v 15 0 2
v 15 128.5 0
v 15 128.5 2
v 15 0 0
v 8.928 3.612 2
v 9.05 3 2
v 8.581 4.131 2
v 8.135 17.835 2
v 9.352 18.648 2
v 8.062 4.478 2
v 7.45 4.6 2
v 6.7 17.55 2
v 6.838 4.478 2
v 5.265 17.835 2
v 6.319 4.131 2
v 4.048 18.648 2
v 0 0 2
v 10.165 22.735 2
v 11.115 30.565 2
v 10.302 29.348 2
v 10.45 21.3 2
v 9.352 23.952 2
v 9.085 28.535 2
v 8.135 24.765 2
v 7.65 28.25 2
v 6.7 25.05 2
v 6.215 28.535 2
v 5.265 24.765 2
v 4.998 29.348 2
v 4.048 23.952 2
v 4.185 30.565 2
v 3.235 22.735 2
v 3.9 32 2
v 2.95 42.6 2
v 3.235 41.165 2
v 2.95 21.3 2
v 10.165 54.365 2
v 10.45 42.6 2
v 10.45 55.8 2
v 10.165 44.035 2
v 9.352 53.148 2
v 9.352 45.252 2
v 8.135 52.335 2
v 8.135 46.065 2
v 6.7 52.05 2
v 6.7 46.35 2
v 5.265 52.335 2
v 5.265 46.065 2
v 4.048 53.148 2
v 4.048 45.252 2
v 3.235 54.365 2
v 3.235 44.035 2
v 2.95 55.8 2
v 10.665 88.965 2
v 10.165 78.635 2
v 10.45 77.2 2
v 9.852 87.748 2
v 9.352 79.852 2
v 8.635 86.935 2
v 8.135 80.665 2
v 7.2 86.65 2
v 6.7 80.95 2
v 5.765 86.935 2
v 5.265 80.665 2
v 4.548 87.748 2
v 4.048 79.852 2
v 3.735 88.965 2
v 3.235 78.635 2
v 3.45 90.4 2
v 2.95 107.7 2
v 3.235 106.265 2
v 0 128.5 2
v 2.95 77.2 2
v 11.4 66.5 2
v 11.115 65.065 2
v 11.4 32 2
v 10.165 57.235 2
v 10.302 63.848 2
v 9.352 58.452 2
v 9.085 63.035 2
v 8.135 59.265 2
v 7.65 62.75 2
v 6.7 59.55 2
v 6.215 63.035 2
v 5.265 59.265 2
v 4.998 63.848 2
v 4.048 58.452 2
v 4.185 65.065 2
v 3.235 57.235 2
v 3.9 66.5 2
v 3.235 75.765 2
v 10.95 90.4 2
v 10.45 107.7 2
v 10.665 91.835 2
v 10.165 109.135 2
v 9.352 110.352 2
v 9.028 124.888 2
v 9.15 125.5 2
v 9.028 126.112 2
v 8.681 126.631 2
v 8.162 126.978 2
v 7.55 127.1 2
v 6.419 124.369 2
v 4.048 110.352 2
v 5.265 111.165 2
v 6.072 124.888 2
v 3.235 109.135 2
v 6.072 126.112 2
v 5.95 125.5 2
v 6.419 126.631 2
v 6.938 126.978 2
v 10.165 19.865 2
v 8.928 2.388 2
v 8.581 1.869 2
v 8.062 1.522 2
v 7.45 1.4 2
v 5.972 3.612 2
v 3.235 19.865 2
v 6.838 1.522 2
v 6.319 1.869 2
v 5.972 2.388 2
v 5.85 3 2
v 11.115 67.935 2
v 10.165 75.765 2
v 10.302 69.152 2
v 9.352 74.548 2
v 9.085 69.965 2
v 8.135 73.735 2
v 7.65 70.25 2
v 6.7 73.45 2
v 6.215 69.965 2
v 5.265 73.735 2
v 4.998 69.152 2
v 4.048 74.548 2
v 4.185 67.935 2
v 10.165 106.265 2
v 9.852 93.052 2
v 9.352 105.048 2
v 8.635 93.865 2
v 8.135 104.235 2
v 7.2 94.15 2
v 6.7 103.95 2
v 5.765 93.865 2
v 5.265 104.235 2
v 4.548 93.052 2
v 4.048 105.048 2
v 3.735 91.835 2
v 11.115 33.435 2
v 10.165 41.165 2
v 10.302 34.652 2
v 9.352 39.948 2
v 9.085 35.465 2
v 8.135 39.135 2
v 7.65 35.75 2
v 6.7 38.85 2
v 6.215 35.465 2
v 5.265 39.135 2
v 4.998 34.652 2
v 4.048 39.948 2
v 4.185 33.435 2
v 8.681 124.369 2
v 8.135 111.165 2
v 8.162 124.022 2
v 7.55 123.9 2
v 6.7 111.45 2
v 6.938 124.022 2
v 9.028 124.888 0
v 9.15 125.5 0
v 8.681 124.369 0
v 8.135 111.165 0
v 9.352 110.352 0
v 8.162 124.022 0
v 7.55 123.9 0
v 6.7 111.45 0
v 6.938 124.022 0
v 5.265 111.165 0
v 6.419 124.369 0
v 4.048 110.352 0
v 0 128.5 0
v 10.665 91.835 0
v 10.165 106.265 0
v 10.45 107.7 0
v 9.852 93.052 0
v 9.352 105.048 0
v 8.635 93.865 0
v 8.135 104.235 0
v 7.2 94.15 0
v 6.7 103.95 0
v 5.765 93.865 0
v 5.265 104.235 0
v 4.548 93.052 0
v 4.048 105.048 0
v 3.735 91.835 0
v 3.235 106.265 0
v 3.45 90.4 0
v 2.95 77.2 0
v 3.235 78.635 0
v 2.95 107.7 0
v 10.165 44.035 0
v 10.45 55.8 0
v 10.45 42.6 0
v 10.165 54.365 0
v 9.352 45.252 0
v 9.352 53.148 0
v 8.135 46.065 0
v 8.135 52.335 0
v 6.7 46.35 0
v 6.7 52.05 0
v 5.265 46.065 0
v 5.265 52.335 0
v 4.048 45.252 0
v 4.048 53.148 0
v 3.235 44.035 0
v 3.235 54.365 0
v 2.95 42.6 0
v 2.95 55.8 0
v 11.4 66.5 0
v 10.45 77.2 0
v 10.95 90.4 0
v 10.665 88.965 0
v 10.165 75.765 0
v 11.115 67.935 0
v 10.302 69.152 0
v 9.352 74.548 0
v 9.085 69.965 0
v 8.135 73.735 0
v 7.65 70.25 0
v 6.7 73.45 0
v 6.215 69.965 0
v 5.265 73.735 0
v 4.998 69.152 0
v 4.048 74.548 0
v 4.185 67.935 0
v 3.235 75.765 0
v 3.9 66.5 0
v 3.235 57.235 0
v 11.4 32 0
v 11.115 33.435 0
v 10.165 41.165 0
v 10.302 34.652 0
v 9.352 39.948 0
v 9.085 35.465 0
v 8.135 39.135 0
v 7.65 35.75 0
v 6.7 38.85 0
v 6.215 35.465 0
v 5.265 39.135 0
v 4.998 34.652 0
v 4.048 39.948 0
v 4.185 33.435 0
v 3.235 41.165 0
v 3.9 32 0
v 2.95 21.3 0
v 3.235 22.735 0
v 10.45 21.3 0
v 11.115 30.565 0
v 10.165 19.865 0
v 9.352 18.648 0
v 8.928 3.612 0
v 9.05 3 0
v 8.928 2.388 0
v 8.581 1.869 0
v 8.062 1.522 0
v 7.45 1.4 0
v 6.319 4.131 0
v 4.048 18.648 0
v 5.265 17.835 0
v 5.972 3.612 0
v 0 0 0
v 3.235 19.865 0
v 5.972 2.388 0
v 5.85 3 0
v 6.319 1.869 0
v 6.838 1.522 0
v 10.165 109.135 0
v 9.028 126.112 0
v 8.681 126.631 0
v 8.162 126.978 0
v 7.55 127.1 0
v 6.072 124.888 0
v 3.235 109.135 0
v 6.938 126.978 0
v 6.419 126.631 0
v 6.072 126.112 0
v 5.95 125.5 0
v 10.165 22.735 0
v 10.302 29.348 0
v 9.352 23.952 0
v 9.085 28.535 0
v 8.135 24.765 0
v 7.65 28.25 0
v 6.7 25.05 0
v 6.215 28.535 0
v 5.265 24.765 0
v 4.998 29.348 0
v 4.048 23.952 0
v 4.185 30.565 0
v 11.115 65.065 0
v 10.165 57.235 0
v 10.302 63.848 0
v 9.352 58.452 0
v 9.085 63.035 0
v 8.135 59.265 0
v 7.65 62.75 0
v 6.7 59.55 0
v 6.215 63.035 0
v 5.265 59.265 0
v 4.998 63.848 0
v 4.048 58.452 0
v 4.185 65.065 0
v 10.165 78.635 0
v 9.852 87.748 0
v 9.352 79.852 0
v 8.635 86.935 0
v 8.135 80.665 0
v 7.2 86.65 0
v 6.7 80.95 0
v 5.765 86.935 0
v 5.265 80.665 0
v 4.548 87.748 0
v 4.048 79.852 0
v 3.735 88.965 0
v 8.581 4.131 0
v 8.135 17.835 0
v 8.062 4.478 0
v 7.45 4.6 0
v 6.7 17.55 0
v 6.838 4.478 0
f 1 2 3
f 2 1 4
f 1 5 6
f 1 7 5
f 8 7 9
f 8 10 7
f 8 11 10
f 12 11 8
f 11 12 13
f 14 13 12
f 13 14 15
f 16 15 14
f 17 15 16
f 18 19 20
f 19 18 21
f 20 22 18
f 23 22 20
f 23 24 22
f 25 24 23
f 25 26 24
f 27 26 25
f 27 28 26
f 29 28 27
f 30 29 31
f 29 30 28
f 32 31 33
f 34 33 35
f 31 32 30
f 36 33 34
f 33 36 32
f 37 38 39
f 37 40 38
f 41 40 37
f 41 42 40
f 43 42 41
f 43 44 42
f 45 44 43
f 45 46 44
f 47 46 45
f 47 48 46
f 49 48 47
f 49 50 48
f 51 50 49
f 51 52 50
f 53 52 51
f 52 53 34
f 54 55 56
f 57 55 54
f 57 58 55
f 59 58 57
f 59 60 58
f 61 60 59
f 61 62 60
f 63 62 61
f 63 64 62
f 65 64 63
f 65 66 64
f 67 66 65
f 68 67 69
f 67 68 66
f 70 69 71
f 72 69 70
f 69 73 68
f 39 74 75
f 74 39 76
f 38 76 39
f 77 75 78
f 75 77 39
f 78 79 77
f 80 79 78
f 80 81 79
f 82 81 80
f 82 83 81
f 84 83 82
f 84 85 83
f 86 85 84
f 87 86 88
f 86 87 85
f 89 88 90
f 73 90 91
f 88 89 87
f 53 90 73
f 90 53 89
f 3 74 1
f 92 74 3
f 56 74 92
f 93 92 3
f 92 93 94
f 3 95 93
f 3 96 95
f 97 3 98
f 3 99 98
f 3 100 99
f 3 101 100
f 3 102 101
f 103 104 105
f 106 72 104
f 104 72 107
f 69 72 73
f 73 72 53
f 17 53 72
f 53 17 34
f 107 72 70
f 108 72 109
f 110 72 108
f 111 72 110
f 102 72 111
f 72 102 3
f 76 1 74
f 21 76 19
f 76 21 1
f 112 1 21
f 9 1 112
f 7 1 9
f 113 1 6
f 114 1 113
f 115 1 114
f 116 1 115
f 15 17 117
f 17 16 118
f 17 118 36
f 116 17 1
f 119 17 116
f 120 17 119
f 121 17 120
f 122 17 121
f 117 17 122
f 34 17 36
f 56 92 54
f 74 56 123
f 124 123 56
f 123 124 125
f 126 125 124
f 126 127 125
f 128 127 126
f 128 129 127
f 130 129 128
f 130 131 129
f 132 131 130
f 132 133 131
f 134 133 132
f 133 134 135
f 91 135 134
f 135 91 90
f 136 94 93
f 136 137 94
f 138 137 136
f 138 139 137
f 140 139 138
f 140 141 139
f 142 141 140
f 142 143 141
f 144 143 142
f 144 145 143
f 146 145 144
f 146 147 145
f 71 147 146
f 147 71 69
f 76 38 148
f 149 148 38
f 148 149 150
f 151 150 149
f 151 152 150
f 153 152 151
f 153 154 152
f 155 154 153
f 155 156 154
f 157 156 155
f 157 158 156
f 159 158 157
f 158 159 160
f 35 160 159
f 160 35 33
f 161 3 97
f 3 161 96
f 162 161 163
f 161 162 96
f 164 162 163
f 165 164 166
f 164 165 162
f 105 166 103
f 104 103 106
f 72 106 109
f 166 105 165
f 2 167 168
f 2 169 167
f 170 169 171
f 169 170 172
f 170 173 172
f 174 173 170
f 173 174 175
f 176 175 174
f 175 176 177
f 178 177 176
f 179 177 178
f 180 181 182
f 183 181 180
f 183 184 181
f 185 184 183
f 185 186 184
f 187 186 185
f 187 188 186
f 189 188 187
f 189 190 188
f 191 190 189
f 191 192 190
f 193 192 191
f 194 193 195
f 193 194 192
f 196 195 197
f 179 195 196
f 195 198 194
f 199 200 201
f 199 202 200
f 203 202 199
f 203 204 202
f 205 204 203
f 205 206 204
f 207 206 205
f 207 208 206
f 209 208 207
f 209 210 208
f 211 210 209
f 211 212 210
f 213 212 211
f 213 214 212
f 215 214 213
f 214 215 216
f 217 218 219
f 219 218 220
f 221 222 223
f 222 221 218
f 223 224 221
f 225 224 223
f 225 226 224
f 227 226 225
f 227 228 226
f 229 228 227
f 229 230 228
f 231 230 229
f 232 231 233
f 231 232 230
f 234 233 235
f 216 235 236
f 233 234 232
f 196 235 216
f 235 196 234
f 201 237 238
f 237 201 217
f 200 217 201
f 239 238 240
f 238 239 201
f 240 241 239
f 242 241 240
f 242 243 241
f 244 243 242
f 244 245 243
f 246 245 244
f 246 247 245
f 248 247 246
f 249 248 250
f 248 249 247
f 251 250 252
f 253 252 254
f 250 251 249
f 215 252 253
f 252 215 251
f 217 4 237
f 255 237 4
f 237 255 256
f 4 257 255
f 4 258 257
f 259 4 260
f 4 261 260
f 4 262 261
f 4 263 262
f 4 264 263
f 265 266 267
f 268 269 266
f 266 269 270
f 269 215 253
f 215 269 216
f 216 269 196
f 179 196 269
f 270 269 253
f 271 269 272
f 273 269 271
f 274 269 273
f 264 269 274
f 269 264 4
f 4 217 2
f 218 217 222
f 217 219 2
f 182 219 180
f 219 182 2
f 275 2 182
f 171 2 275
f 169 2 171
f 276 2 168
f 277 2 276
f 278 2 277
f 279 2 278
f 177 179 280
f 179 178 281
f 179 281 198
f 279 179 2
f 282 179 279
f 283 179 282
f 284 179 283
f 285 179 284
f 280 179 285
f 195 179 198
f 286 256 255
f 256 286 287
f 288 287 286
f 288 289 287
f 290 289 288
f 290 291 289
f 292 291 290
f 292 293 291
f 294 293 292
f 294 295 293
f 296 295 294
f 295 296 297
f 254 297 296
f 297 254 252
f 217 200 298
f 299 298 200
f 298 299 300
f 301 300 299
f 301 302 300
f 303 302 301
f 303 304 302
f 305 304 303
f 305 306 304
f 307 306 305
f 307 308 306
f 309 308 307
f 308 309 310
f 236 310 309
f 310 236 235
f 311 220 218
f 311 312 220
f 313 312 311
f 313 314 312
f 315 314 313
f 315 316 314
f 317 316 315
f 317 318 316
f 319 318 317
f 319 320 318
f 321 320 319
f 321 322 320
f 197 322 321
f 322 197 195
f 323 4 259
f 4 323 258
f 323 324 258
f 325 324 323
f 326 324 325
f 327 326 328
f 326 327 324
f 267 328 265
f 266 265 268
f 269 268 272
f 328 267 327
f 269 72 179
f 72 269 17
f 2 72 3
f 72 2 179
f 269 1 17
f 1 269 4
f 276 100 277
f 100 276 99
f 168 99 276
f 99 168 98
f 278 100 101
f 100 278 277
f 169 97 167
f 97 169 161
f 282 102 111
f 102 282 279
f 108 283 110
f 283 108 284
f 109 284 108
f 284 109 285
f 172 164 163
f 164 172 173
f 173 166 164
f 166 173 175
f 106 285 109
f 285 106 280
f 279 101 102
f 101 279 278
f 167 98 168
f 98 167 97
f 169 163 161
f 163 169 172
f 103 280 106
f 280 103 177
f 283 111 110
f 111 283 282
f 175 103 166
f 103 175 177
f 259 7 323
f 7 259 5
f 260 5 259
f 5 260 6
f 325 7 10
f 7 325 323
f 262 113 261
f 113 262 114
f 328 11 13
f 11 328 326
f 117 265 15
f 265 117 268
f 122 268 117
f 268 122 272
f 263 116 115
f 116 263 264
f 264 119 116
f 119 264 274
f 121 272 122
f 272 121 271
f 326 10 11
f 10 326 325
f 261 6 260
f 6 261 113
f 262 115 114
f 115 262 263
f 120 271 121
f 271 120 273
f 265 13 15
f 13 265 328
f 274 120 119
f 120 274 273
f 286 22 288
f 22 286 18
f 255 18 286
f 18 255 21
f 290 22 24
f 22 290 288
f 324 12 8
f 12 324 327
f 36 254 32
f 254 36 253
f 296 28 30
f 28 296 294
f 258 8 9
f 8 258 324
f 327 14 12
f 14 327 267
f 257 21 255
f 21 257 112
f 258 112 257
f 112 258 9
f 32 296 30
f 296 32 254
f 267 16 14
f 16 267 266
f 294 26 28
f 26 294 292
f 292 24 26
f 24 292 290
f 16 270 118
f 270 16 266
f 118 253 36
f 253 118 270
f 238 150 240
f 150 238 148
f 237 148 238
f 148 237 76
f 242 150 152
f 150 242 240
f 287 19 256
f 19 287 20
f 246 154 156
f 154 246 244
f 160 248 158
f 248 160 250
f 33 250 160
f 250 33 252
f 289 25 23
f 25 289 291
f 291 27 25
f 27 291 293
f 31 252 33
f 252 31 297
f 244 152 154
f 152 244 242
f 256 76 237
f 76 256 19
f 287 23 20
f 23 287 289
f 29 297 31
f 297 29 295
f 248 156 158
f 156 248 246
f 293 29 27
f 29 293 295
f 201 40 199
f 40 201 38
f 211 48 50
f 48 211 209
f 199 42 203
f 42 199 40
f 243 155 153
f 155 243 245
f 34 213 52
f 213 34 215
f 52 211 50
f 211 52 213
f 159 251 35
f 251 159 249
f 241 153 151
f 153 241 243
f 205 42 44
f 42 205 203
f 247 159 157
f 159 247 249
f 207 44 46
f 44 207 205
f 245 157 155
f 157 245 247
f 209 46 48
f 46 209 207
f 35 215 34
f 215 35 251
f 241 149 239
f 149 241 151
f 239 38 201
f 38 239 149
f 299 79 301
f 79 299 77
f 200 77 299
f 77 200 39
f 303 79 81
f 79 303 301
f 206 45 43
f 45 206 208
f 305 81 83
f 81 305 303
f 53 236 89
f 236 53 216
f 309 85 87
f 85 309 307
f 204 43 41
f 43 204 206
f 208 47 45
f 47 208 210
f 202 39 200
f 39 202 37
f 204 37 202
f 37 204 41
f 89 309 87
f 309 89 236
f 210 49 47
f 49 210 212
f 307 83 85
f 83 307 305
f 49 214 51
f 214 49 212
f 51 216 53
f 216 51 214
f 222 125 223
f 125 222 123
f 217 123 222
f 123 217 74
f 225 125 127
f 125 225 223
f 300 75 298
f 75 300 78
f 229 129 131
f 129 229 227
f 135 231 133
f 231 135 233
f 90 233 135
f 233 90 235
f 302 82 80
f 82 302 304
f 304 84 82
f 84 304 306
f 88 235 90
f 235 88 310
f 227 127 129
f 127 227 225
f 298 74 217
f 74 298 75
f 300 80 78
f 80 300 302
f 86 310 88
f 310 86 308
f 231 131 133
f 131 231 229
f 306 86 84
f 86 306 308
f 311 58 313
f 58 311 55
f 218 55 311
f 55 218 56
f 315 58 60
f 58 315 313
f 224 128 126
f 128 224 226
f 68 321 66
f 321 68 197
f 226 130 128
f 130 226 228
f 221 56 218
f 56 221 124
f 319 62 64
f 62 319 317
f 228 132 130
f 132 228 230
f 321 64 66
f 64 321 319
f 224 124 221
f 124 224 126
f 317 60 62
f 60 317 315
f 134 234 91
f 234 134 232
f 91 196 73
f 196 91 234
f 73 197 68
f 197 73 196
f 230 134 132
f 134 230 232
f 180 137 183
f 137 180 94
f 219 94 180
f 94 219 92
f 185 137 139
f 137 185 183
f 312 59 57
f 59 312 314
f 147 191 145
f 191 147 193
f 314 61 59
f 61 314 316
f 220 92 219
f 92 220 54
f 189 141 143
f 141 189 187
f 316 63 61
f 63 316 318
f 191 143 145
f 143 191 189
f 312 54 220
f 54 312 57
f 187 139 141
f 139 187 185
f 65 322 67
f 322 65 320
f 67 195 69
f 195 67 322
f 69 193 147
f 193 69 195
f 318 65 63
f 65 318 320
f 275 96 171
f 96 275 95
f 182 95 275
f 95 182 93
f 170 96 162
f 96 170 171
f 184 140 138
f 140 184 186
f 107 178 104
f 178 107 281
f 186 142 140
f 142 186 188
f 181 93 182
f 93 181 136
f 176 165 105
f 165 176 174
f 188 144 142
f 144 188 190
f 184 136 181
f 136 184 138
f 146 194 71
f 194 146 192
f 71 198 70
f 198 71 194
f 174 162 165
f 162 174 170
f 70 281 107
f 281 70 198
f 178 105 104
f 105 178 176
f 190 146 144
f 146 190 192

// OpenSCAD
$fn=16;

// Dimensions
panel_width = floor(3 * 5.08);    // 3HP
panel_height = 128.5;  // 3U
panel_thickness = 2.00;

// Mounting holes
mount_offset_y = 3;
mount_offset_x = 7.45;
mounting_hole_diameter = 3.2; // M3

// Compoonent hole sizes
jack_hole_diameter = 7.5; // 3.5mm
toggle_hole_diameter = 7.5;
pot_hole_diameter = 7.5;

module jack(y_pos) {
    translate([panel_width - 8.3, y_pos, panel_thickness / 2])
        cylinder(d = jack_hole_diameter, h = panel_thickness + 1, center = true);
}

module toggle(y_pos) {
    translate([panel_width - 7.35, y_pos, panel_thickness / 2])
        cylinder(d = toggle_hole_diameter, h = panel_thickness + 1, center = true);
}

module pot(y_pos) {
    translate([panel_width - 7.8, y_pos, panel_thickness / 2])
        cylinder(d = pot_hole_diameter, h = panel_thickness + 1, center = true);
}

module mounting_hole(x_pos, y_pos) {
    translate([x_pos, y_pos, panel_thickness / 2])
        cylinder(d = mounting_hole_diameter, h = panel_thickness + 1, center = true);
}


jack_height = 10;
toggle_height = 15;
pot_height = 22.5;

buffer = 0.5;

jack2toggle_y = (jack_height + toggle_height) / 2 + buffer;
jack2jack_y = jack_height + buffer;
jack2pot_y = (jack_height + pot_height) / 2 + buffer;

jack1_y = 21.3;
toggle1_y = 32;
jack2_y = jack1_y + 21.3;
jack3_y =  jack1_y + 34.5;
toggle2_y = toggle1_y + 34.5;
jack4_y =  jack1_y + 55.9;
pot1_y = 90.4;
jack5_y =  jack1_y + 86.4;

module panel() {
    difference() {
        // Base panel
        cube([panel_width, panel_height, panel_thickness]);

        // Mounting holes
        mounting_hole(panel_width - mount_offset_x, panel_height - mount_offset_y);
        mounting_hole(mount_offset_x, mount_offset_y);

        // Components (Jacks, Toggles, Pot)
        jack(jack1_y);
        toggle(toggle1_y);
        jack(jack2_y);
        jack(jack3_y);
        toggle(toggle2_y);
        jack(jack4_y);
        pot(pot1_y);
        jack(jack5_y);
    }
}

panel();
